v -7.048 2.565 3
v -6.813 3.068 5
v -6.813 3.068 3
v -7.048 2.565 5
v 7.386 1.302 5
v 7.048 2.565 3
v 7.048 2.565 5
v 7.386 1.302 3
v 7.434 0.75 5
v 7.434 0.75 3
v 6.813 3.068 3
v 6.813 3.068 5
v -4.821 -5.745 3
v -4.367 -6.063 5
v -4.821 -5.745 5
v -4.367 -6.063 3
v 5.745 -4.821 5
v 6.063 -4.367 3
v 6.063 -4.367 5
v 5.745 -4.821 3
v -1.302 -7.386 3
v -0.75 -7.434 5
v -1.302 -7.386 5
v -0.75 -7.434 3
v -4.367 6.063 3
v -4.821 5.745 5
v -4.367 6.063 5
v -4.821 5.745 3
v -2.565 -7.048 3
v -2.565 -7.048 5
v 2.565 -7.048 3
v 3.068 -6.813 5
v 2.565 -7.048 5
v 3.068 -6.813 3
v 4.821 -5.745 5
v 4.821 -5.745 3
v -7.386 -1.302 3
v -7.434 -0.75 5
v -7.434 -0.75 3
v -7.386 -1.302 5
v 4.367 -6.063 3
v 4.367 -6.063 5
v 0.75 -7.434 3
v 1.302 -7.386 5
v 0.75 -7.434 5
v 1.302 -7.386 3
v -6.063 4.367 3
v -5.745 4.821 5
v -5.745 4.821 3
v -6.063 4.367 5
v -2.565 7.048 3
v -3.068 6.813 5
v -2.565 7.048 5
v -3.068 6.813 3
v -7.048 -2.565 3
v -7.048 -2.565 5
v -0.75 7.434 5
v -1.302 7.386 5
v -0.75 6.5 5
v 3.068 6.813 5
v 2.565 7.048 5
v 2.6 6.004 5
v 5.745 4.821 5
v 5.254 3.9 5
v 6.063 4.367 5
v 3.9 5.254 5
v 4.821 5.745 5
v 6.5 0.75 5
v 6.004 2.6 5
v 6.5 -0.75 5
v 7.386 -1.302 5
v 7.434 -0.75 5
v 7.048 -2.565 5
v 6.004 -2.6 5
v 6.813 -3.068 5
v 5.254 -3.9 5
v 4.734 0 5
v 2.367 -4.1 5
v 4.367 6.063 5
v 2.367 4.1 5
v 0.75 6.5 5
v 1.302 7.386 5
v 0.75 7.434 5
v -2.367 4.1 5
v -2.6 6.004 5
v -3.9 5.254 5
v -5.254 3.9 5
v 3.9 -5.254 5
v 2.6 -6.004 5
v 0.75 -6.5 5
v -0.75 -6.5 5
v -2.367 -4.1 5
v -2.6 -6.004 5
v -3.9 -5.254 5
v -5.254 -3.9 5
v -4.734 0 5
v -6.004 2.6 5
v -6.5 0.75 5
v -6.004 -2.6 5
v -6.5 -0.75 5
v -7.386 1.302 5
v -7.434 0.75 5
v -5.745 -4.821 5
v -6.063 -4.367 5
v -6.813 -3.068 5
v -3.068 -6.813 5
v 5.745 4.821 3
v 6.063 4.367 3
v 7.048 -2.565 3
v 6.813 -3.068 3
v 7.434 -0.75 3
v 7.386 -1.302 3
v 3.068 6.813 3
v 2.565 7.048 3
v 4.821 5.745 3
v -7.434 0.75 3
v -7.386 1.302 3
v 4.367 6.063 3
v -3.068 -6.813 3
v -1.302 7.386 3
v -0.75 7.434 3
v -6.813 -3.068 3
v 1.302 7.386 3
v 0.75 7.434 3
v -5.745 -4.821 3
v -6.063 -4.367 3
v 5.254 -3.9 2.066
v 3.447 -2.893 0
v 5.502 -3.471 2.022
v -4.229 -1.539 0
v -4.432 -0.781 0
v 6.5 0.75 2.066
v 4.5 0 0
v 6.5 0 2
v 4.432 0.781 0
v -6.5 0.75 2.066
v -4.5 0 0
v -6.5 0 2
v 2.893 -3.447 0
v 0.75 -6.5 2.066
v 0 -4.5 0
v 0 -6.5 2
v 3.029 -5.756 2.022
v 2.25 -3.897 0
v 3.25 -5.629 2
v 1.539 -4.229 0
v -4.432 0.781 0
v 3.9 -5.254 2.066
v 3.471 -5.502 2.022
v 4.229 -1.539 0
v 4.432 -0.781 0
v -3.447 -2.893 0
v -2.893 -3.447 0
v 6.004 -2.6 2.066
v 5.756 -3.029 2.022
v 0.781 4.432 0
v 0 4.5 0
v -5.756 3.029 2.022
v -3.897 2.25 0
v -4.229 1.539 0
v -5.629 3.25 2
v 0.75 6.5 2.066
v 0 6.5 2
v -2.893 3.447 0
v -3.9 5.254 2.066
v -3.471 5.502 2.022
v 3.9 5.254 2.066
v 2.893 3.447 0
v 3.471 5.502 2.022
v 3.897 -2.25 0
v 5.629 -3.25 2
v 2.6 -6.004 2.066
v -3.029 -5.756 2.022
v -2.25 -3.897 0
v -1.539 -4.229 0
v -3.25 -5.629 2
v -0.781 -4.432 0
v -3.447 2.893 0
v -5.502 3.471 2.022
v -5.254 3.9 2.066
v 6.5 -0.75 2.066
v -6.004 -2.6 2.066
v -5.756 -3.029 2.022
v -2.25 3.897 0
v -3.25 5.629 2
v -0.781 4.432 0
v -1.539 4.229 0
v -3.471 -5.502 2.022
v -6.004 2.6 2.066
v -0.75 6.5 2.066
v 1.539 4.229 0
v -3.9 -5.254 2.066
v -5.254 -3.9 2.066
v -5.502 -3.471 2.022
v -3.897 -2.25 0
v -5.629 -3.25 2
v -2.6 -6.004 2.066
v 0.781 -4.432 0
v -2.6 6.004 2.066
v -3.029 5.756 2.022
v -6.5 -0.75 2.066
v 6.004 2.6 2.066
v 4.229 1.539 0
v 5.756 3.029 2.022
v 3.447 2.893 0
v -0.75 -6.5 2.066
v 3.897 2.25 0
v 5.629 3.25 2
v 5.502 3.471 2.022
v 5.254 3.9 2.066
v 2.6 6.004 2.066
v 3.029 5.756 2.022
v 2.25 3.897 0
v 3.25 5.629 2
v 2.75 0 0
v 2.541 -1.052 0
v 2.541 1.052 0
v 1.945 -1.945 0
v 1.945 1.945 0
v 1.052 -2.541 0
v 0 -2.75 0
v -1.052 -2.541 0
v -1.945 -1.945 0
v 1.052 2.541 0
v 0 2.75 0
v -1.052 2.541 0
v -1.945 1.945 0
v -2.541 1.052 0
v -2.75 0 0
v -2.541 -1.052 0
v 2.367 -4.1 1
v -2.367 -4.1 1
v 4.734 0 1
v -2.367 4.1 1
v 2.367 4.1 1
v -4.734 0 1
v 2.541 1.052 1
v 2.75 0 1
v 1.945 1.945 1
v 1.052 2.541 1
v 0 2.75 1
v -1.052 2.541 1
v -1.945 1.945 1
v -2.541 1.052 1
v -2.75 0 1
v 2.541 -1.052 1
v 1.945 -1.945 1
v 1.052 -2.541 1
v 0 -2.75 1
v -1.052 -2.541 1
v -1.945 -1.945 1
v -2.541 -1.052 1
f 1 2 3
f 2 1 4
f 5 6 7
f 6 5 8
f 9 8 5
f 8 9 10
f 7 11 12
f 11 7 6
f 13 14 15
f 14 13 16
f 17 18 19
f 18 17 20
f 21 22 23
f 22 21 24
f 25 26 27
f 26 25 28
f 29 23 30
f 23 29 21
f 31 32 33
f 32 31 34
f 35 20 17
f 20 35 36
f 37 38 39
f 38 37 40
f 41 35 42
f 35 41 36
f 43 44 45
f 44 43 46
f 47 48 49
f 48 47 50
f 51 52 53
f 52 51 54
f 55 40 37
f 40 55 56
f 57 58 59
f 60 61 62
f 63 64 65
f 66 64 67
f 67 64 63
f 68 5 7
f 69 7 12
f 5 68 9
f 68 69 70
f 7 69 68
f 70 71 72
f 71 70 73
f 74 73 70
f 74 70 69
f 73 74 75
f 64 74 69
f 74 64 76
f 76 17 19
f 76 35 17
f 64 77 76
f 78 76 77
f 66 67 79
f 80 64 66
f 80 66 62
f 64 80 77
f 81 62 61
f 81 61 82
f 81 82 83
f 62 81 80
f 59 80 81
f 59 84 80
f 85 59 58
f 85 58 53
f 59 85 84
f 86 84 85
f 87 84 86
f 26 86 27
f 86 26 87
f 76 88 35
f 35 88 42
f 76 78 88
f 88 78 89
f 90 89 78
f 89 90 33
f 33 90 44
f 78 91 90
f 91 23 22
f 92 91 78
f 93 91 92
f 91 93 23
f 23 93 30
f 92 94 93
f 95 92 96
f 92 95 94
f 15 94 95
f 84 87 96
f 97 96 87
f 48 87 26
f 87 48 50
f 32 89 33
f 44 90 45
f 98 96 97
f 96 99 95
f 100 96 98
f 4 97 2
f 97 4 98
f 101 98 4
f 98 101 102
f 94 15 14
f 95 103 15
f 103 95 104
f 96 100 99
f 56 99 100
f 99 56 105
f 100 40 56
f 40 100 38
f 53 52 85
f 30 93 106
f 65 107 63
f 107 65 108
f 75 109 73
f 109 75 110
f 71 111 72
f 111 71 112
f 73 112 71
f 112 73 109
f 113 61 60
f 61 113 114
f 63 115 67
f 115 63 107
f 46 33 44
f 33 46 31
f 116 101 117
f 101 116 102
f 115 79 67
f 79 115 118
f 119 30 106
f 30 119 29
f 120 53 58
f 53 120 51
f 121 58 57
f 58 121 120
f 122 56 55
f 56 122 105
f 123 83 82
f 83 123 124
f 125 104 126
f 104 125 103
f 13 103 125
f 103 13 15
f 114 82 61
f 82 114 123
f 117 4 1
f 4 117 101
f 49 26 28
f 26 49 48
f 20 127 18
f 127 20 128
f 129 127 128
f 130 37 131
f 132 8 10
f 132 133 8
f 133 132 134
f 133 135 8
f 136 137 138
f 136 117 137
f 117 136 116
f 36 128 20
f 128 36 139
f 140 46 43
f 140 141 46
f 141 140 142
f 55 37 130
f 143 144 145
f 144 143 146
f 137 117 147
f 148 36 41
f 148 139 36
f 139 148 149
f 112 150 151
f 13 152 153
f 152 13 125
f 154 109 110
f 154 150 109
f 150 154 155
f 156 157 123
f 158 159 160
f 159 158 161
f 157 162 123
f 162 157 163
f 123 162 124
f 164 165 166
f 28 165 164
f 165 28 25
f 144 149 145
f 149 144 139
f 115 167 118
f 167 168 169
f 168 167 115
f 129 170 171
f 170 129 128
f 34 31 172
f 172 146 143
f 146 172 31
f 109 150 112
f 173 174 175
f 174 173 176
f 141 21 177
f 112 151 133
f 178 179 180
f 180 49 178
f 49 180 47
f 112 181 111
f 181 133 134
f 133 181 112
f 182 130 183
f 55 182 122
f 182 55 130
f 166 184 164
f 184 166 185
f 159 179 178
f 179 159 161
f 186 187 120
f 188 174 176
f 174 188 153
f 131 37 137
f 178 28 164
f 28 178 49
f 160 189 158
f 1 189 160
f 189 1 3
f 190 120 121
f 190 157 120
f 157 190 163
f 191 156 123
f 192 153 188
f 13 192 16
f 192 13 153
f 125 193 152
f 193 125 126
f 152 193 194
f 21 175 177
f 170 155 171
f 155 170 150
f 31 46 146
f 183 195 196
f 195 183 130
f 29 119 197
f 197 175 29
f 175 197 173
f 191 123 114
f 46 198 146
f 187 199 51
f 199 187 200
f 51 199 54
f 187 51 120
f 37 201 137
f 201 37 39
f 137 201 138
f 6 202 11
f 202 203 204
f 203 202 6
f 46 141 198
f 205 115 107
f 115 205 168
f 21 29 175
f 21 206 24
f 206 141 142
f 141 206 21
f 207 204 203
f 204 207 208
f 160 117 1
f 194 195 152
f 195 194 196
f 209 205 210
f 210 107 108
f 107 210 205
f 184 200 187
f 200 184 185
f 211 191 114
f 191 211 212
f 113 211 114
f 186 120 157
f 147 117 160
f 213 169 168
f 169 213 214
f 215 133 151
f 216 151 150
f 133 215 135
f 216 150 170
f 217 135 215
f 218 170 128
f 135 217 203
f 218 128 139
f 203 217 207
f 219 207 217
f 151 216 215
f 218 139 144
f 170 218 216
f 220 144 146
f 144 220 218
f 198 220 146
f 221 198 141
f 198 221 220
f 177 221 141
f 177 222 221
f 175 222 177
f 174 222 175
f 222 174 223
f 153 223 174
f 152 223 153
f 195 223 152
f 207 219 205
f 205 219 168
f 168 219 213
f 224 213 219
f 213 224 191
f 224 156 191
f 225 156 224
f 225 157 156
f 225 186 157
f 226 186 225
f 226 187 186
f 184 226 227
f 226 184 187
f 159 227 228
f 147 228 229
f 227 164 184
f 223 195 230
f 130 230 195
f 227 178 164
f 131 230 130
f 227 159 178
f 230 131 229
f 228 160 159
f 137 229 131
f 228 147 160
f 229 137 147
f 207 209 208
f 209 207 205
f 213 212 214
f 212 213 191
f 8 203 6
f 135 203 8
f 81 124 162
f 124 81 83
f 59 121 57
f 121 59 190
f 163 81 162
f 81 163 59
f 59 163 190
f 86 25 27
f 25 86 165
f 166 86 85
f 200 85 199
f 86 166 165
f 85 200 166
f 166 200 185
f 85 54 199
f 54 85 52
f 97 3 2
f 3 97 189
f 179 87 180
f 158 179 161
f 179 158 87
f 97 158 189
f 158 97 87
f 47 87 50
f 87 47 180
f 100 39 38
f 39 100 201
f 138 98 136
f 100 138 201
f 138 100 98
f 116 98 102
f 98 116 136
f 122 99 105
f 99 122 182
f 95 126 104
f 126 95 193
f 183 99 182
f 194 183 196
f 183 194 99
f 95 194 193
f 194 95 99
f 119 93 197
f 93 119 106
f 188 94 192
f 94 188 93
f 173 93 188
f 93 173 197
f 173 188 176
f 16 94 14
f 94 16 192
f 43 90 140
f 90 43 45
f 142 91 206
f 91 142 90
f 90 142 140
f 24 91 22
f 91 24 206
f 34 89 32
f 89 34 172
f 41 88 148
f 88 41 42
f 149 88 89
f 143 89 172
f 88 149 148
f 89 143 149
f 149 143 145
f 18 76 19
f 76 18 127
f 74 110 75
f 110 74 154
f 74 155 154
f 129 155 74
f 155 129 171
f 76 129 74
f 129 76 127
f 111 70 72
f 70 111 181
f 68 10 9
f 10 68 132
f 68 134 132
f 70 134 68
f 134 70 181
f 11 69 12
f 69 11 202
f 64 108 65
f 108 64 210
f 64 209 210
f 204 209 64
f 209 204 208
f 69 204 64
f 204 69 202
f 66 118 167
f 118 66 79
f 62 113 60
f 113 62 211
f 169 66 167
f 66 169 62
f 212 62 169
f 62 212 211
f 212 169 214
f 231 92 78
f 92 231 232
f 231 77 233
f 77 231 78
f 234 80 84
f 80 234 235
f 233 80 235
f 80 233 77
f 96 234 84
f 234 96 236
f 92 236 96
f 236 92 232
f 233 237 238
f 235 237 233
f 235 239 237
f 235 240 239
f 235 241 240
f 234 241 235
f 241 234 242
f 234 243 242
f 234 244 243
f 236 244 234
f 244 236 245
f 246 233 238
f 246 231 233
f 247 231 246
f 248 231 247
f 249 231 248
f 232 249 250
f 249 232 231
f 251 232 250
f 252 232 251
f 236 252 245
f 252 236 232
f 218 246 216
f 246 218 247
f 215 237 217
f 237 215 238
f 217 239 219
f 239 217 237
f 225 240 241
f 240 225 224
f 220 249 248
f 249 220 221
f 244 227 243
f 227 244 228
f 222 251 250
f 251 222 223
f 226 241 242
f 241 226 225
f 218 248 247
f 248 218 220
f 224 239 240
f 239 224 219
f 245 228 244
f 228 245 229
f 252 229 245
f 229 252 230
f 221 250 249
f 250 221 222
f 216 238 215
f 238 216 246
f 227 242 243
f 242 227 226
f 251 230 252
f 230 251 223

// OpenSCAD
// file: config.scad
// Paramètres de la machine

decal=-30;            // décallage du chassis xz
hauteur=400;          // hauteur totale chassis
largeur=400;          // largeur totale chassis
longueur=470;         // longueur totale chassis
hauteur_base=90;      // hauteur de la base
entraxe_y=140;        // distance entre les tiges Ø8 axe Y
entraxe_x=45;         // distance entre les tiges Ø8 axe X

couleur=[1,0.6,0];



// Paramètre des pièces et jeux

// écart plateau/courroie
// y_belt_holder
belt_h=13;      // écart entre la courroie et le plateau

// écart plateau/tiges lisses
// y_lm8uu
decal_plateau=12; // Décallage en Y

// décallage des tiges lisses Y
// support_tige8_y
decal_tiges=5;

// décallage moteur Y
// y_motor
decal_motory_z=11;
decal_motory_y=25;

// Equerres de fixation position fermée
eq_ec=10;      // écart entre profilés

// Fixations axe Z
pos_z=26;      // position des axes par rapport au profilé (>= 21)
hauteur_z=20;  // hauteur des fixations
entraxe_z=17;  // distance entre les tiges Ø8 et M5
// est ce que la tige de 8 dépasse du profilé de 30?
// si oui, on décale les fixations
decalx=max(-42/2+entraxe_z+8/2+2, 0);

// Roulements linéaires
lbd = 15; // diamètre ext
lbh = 24; // hauteur

// x_carriage
he_x=23;  // entraxe hotend x
he_y=23;  // entraxe hotend y
sen_x=13; // entraxe capteur x
sen_y=23; // entraxe capteur y

// Plats écrous
ec3=5.7;
ec4=7.2;
ec5=8.2;
ec6=10.2;

// Jeu sur plats pour les écrous glissants
jec=0.2;

// hauteur écrous
ec3h=2.4;
ec4h=3.2;
ec5h=4.7;
ec6h=5.2;

// Vis
vis3=3.5;
vis4=4.5;
vis5=5.5;
vis6=6.5;

// nombre de dents des poulies
poulie=20;

// Pas des courroies
pas=2;

// diamètre des poulies
dpoulie=poulie*pas/3.1416;
// main file
// eLKa1
// molette_m5
// GNU GPL v3
// lkiefer <blog.lkiefer.org> and contributors
// http://www.reprap.org/wiki/ELKa
// https://github.com/kimented/elka1

include <config.scad>;

module molette_m5(){

  n=12;     // nombre de moletages
  lar=1.5;  // largeur des moletages
  h=5;      // hauteur totale
  d=15;     // diamètre extérieur
  ch=3;     // hauteur du chanfrein
  plat=8.2; // sur plats 6 pans
  vis=5.5;  // diamètre de la vis
  plat2=4;  // hauteur des plats de serrage

  echo ("molette_m5");

  color (couleur) {
    difference(){
      union(){
        translate([0,0,ch]) cylinder(h=h-ch, d=d, $fn=n*3);
        cylinder(h=ch, d2=d, d1=d-ch*2, $fn=n*3);
      }
      
      for(i=[0:1:n-1]){
        rotate([0,0,360/n*i]) translate([-lar/2,d/2-1,-1]) cube([lar,5,h+2]);
      }
      translate([0,0,h-plat2]) cylinder(d=plat*2/sqrt(3), h=plat2+1, $fn=6);
      translate([0,0,-1])cylinder(d=vis, h=h+2, $fn=16);
      //cube([30,30,30]); //coupe
    }
  }
}

molette_m5();
